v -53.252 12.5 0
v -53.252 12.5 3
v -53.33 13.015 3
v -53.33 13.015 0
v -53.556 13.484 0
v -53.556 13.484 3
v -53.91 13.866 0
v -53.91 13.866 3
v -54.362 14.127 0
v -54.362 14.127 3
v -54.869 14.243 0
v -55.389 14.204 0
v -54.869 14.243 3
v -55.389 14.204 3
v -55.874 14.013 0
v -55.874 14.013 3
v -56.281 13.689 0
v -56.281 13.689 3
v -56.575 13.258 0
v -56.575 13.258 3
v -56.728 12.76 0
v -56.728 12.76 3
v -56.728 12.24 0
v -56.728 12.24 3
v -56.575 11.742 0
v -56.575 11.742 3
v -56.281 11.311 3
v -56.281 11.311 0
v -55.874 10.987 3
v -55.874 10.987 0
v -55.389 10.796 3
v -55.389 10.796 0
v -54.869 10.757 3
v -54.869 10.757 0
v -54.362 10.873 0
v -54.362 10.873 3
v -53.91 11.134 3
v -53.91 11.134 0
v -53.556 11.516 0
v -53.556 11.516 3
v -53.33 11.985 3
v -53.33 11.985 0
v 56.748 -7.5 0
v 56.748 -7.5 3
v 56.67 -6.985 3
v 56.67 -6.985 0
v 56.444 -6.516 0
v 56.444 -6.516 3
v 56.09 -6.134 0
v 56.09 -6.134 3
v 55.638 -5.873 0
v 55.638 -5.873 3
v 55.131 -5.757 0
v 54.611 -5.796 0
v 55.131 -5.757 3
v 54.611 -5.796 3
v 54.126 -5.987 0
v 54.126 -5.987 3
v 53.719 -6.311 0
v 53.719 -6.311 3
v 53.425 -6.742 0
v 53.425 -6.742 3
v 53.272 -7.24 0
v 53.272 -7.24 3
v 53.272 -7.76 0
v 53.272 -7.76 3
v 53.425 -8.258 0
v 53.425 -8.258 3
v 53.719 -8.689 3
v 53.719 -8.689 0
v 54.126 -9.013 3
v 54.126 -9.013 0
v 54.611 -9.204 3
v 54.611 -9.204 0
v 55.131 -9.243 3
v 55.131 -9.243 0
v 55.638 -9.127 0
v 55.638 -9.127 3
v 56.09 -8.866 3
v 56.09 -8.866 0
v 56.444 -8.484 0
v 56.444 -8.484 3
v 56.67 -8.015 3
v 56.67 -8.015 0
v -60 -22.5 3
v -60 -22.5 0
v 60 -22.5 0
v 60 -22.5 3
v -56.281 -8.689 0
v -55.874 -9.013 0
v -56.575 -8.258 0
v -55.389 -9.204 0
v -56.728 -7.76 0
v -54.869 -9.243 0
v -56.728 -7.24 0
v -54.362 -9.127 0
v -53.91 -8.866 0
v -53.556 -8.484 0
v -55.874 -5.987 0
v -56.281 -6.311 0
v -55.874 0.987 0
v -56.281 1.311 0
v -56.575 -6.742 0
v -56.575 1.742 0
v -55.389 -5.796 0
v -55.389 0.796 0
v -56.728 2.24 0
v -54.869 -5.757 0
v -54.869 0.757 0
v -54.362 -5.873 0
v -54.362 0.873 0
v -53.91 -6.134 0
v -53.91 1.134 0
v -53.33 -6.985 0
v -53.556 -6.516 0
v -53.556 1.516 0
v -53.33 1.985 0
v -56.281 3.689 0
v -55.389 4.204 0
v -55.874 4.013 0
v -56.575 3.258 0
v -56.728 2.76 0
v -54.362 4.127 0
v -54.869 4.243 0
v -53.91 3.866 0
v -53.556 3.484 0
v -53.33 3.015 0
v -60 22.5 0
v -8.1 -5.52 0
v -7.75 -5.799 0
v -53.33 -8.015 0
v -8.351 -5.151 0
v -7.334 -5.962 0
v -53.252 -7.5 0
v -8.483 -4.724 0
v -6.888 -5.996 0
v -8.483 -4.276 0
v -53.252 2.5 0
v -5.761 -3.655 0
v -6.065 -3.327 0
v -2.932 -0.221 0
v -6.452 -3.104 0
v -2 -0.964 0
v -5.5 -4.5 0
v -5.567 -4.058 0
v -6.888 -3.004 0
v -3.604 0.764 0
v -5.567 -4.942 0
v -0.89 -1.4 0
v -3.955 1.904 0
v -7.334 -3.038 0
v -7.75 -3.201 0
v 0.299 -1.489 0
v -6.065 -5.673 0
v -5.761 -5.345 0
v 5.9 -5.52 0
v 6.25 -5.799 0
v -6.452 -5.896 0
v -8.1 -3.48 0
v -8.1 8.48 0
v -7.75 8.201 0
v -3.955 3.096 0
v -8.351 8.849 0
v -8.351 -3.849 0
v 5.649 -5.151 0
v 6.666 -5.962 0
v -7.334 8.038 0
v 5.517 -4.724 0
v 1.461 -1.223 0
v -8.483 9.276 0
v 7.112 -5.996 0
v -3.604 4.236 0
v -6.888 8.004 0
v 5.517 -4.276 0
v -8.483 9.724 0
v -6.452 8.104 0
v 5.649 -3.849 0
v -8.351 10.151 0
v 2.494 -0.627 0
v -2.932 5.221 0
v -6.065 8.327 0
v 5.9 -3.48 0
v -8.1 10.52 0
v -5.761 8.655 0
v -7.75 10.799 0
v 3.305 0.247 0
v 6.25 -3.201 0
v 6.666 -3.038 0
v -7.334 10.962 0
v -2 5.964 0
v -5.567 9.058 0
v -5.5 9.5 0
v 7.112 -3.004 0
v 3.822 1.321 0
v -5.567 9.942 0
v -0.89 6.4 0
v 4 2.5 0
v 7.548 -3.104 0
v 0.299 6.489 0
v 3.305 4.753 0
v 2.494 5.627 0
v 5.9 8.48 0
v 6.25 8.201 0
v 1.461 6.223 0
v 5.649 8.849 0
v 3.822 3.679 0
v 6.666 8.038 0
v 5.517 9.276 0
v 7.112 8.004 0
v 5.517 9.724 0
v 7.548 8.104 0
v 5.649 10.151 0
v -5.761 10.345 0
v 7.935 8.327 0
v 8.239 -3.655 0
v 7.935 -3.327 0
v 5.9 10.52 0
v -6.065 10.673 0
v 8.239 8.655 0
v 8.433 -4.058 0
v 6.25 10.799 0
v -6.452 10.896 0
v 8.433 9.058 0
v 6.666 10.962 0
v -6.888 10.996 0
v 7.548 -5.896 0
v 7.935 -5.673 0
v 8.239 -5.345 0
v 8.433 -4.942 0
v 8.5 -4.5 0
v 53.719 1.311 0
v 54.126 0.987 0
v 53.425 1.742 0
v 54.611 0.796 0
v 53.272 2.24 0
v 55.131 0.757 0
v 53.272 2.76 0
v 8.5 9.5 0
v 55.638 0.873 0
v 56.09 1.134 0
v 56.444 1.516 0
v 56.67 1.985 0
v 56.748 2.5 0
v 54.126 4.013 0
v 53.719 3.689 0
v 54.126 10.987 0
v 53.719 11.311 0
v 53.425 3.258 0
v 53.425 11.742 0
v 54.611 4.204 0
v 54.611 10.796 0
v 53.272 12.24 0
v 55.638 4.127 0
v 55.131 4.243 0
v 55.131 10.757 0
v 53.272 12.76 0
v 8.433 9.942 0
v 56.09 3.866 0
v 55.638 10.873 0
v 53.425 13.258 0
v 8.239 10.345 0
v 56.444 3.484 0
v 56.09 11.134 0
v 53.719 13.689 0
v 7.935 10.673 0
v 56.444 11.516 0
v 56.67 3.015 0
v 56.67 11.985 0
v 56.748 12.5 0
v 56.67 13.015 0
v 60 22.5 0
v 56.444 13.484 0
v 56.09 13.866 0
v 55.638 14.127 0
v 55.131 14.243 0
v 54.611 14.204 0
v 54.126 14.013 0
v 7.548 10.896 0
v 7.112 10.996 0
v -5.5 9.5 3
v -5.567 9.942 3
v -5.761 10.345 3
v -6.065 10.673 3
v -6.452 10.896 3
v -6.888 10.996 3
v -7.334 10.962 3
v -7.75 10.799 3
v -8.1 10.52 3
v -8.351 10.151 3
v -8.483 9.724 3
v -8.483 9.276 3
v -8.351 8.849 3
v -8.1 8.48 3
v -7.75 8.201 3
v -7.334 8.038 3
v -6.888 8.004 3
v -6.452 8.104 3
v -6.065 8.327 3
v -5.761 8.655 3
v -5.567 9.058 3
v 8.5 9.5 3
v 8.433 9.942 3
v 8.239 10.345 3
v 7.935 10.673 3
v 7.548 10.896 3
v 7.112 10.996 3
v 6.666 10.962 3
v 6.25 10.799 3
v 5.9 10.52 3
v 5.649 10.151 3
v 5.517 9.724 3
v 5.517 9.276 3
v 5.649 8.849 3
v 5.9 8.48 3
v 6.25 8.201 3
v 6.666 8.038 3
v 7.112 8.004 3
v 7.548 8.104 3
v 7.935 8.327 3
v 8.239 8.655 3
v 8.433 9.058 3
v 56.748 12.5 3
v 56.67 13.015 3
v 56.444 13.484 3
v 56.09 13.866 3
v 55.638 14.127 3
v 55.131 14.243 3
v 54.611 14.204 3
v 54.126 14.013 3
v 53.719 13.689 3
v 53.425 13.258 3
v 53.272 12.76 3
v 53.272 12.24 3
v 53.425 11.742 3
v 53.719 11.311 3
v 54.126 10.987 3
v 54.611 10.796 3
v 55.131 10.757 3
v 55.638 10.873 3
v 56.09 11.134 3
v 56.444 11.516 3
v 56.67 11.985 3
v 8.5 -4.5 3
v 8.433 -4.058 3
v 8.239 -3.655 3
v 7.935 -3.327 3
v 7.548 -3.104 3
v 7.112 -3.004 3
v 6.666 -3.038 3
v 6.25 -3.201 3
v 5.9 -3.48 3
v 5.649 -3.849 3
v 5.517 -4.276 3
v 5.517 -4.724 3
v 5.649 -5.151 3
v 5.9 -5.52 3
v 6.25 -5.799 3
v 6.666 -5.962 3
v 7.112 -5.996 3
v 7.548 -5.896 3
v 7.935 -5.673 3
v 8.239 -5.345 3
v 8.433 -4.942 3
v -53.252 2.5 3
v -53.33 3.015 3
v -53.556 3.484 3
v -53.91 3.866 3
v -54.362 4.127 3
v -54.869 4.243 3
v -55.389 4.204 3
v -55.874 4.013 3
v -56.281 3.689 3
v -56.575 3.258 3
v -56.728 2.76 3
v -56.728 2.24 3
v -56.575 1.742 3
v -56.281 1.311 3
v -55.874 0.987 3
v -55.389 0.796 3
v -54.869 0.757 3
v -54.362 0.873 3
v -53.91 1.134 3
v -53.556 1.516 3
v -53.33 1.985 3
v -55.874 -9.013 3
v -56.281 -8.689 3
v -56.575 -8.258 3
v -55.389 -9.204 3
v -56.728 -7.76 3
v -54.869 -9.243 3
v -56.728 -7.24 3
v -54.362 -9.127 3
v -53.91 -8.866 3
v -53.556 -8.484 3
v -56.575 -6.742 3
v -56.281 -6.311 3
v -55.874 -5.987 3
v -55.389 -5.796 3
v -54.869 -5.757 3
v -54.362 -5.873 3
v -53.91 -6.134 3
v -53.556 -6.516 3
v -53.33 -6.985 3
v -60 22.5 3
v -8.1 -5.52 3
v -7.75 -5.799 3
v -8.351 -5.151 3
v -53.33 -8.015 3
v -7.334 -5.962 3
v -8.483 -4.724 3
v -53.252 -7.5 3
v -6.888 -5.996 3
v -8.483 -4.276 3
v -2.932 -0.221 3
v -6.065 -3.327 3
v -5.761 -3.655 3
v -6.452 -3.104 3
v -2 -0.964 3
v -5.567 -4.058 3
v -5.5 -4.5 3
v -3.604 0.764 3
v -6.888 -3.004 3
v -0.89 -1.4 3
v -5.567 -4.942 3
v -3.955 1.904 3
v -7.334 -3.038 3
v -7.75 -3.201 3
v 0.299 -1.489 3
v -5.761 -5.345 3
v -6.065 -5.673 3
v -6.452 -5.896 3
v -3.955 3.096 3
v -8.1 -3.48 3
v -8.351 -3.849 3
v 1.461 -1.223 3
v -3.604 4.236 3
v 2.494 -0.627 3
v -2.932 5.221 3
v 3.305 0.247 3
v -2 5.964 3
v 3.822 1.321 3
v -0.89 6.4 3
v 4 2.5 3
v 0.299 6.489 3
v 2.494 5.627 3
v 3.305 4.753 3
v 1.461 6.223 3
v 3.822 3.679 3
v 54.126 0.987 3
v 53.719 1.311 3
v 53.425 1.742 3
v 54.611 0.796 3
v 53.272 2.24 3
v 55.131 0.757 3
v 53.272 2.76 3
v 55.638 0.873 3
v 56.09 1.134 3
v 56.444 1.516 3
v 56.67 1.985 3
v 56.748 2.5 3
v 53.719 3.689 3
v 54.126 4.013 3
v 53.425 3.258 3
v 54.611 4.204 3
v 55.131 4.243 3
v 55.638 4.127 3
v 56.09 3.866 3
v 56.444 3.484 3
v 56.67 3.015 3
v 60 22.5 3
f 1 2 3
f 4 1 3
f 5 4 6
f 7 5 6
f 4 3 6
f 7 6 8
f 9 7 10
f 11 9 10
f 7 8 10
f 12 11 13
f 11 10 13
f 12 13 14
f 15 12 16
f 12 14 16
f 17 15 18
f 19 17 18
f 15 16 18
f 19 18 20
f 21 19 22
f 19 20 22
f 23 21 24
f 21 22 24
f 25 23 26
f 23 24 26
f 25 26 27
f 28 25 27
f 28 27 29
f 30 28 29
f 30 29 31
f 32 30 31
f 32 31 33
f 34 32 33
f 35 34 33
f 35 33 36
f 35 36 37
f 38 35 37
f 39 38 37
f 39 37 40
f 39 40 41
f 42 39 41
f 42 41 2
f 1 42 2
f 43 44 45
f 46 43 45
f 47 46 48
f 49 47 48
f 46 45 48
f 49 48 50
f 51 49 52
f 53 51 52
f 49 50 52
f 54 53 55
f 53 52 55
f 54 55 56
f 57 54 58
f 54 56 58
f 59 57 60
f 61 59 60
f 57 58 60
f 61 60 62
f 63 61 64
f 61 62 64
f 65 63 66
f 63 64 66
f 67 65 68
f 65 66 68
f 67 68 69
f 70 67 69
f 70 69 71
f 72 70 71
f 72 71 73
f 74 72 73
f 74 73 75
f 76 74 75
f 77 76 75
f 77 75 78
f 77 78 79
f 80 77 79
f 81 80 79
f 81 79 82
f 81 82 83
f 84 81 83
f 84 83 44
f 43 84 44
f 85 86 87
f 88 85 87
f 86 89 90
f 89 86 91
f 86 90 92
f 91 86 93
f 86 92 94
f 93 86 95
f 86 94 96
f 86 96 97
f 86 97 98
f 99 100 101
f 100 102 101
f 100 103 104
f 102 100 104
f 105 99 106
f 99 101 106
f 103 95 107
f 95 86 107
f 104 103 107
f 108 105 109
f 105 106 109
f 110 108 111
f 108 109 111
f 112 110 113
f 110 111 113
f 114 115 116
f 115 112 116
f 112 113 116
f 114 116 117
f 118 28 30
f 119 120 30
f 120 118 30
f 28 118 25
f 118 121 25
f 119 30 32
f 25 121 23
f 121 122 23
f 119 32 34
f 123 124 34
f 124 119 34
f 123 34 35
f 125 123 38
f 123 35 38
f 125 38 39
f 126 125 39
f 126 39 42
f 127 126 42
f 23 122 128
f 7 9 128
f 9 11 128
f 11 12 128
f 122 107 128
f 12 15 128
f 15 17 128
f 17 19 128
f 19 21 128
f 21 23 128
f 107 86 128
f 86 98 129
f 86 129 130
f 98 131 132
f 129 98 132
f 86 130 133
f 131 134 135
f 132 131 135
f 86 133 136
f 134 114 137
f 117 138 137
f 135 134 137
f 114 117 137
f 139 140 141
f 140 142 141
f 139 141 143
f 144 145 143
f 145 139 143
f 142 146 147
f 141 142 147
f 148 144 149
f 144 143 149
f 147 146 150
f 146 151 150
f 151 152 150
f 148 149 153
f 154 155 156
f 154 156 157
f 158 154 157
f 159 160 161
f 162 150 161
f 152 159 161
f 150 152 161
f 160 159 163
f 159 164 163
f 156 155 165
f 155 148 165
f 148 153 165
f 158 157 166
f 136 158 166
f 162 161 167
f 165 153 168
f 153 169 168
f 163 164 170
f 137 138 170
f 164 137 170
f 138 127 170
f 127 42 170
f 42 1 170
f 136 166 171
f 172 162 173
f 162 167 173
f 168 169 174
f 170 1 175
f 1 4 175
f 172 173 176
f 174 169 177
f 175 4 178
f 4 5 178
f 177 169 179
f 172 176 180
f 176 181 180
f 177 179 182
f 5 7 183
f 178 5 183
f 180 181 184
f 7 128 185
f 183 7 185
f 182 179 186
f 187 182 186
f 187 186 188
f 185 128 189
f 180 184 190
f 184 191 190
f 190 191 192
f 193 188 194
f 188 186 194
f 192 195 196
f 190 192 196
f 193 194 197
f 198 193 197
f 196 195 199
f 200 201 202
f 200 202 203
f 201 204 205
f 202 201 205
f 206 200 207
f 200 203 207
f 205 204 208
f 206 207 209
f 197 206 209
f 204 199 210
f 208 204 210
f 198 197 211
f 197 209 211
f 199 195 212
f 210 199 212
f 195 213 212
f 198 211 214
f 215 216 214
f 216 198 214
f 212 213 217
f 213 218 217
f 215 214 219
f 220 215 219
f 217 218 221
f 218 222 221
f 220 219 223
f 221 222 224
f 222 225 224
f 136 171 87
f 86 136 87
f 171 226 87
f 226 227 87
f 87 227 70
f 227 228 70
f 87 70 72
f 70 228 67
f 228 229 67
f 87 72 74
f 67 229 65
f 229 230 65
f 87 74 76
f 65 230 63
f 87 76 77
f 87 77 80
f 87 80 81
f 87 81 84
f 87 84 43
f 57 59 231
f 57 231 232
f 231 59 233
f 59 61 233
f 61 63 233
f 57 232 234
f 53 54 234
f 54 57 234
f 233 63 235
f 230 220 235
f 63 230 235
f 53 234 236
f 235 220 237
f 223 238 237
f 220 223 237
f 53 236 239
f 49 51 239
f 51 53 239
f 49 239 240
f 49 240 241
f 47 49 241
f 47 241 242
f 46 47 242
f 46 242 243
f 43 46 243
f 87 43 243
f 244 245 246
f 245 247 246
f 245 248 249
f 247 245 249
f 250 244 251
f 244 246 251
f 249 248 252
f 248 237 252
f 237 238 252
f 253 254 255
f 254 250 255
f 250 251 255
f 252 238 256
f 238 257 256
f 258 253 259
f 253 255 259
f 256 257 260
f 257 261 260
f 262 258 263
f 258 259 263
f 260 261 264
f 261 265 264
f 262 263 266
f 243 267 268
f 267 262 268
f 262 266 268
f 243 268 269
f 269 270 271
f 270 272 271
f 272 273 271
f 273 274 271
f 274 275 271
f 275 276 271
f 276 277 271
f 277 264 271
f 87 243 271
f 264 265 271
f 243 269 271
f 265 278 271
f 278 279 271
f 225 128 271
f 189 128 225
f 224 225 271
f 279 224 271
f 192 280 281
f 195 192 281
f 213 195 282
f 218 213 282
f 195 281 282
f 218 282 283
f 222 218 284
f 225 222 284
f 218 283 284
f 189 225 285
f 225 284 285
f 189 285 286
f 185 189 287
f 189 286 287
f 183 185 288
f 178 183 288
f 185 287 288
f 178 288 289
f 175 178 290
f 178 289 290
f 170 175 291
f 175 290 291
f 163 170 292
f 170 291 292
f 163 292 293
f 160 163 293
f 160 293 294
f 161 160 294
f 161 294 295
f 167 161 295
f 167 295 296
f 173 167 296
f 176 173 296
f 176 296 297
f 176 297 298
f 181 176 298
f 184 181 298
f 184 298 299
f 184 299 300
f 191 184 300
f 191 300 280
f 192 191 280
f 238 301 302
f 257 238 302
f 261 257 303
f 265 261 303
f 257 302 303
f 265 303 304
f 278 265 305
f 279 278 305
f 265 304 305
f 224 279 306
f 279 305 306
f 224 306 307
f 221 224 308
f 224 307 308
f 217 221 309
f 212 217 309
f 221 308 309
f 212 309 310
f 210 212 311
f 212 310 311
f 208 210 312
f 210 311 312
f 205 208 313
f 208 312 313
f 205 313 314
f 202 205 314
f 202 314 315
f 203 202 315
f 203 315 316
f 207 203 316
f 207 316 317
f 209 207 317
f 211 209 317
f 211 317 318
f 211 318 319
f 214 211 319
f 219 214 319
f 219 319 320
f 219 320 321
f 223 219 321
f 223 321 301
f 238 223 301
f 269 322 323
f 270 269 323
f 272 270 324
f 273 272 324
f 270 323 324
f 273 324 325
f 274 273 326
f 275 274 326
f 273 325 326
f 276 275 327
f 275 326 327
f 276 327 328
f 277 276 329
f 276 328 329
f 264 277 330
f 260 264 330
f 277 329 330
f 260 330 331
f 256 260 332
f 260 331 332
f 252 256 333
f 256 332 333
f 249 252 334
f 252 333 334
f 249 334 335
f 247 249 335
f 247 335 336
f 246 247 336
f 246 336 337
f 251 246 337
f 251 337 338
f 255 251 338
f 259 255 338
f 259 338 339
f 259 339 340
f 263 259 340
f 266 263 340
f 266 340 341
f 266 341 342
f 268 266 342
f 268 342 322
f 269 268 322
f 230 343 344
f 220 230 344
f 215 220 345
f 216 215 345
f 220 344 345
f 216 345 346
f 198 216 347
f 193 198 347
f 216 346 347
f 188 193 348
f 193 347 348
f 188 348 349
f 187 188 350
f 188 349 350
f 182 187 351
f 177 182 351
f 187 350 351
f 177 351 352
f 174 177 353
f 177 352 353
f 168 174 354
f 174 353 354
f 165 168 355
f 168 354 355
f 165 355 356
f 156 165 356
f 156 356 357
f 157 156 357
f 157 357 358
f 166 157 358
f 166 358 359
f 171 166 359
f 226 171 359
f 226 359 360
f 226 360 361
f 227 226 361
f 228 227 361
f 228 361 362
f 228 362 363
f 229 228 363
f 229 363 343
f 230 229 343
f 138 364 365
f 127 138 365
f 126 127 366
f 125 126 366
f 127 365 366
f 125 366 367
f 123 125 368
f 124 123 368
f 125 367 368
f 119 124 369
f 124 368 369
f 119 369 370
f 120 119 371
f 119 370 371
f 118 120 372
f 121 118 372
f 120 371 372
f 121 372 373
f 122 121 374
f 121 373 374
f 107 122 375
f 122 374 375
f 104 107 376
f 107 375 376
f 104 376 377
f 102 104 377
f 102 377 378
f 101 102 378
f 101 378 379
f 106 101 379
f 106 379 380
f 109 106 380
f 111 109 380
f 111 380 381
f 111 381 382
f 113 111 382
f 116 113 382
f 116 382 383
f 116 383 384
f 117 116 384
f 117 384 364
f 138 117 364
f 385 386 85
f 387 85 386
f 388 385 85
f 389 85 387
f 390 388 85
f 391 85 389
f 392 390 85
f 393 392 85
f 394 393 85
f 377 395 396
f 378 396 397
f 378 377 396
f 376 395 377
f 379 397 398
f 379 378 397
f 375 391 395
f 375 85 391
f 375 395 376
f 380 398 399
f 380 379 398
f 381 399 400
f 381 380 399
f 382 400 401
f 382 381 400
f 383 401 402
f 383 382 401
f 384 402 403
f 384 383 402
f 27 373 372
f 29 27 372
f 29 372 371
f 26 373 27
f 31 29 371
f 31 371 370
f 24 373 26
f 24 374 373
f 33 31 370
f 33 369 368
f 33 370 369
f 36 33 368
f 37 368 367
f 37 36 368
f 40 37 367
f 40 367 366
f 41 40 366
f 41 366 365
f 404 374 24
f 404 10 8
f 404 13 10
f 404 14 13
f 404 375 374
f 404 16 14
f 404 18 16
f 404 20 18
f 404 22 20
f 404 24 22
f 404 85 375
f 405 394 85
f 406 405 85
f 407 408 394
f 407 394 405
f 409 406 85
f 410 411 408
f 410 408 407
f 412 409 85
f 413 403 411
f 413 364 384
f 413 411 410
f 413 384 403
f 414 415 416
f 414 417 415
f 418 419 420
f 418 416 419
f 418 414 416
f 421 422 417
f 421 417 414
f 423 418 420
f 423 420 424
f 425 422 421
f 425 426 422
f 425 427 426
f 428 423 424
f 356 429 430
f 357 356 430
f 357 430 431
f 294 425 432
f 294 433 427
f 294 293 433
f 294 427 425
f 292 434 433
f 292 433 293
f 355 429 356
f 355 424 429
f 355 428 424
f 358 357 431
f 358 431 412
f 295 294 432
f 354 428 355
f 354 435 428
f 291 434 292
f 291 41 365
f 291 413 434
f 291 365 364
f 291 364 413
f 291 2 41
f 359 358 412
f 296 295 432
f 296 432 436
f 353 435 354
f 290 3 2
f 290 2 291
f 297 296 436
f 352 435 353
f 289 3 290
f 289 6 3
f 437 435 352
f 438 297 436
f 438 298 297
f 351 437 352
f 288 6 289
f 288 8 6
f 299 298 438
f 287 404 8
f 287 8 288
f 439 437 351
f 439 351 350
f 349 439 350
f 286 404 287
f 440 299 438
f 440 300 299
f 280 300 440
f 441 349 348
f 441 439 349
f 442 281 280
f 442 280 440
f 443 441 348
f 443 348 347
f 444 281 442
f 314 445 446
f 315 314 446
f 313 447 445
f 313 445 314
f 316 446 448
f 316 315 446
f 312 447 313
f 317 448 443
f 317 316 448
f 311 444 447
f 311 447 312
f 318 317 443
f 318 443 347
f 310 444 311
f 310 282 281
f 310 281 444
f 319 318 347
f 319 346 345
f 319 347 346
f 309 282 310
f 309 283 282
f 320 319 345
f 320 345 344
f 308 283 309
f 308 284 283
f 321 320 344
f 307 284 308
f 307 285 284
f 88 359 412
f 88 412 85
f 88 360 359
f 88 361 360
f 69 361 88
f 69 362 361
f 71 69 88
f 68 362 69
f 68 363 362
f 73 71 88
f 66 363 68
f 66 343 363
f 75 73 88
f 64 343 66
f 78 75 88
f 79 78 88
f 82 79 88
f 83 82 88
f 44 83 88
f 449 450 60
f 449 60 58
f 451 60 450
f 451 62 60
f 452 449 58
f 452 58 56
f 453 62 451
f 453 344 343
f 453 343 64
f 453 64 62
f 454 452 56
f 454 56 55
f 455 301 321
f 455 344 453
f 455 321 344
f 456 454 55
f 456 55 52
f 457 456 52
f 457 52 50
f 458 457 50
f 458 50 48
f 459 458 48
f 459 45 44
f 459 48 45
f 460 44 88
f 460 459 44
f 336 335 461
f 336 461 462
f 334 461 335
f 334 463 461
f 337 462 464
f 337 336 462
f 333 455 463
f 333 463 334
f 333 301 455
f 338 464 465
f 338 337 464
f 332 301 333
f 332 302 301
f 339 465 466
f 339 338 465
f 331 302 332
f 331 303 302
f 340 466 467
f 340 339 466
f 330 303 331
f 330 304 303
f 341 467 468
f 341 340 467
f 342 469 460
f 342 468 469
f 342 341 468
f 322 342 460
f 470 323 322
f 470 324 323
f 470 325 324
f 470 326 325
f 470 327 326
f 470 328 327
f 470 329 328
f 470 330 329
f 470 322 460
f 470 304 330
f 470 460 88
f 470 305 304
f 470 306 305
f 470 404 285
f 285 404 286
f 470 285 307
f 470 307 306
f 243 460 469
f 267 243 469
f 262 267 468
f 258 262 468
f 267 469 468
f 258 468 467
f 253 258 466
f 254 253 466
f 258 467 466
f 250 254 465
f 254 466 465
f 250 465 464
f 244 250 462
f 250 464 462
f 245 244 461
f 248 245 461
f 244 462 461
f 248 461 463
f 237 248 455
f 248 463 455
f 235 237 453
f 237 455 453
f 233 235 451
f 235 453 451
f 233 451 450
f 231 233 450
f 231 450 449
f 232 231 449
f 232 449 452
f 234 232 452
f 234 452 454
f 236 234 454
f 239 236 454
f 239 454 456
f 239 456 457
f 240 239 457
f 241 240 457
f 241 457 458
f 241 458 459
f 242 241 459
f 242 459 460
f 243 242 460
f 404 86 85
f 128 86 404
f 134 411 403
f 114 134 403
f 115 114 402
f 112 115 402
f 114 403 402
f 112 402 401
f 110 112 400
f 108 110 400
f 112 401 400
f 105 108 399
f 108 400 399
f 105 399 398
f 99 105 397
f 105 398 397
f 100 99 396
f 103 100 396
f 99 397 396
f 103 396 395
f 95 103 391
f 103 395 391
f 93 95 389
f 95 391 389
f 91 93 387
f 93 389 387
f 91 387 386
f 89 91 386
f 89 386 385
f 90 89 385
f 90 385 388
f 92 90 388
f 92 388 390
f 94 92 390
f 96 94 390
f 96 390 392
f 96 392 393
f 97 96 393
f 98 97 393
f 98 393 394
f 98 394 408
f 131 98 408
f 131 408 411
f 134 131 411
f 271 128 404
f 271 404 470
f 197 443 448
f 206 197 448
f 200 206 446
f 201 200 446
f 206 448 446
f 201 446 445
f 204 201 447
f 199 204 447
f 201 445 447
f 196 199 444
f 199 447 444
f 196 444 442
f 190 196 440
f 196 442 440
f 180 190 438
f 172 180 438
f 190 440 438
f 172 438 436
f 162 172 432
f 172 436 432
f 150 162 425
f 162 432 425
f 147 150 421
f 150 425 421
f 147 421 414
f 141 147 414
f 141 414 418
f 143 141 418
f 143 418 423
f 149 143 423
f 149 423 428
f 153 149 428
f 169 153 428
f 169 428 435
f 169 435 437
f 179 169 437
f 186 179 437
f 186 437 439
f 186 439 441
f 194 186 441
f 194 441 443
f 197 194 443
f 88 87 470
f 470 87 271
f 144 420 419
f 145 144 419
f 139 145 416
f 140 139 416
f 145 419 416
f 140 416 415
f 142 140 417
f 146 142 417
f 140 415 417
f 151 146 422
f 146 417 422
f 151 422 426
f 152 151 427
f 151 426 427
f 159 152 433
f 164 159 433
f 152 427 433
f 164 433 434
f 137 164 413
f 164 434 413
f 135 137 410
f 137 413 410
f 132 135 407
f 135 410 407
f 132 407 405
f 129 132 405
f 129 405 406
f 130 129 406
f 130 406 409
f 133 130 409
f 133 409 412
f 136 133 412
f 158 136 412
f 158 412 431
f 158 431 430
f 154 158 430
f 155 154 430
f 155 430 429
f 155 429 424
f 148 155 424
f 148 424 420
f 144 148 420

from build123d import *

# Parameters (mm, degrees)
ESQUISSE1_W             = 120
ESQUISSE1_H             = 45
BOSS_EXTRU_1_DEPTH      = 3
ESQUISSE2_R             = 1.747592995
ESQUISSE2_R_2           = 4
ESQUISSE2_R_3           = 1.5
ENL_V_MAT_EXTRU_1_DEPTH = 10


with BuildPart() as part:
    # Esquisse1 → Boss.-Extru.1 (new body)
    with BuildSketch(Plane.XY):
        Rectangle(ESQUISSE1_W, ESQUISSE1_H)
    extrude(amount=BOSS_EXTRU_1_DEPTH)

    # Esquisse2 → Enlèv. mat.-Extru.1 (cut)
    with BuildSketch(Plane.XY.offset(3)):
        with Locations((-55, 12.5)):
            Circle(ESQUISSE2_R)
        with Locations((55, 12.5)):
            Circle(ESQUISSE2_R)
        with Locations((-55, 2.5)):
            Circle(ESQUISSE2_R)
        with Locations((-55, -7.5)):
            Circle(ESQUISSE2_R)
        with Locations((55, -7.5)):
            Circle(ESQUISSE2_R)
        with Locations((55, 2.5)):
            Circle(ESQUISSE2_R)
        with Locations((0, 2.5)):
            Circle(ESQUISSE2_R_2)
        with Locations((-7, 9.5)):
            Circle(ESQUISSE2_R_3)
        with Locations((7, 9.5)):
            Circle(ESQUISSE2_R_3)
        with Locations((7, -4.5)):
            Circle(ESQUISSE2_R_3)
        with Locations((-7, -4.5)):
            Circle(ESQUISSE2_R_3)
    extrude(amount=-ENL_V_MAT_EXTRU_1_DEPTH, mode=Mode.SUBTRACT)


solid = part.part
